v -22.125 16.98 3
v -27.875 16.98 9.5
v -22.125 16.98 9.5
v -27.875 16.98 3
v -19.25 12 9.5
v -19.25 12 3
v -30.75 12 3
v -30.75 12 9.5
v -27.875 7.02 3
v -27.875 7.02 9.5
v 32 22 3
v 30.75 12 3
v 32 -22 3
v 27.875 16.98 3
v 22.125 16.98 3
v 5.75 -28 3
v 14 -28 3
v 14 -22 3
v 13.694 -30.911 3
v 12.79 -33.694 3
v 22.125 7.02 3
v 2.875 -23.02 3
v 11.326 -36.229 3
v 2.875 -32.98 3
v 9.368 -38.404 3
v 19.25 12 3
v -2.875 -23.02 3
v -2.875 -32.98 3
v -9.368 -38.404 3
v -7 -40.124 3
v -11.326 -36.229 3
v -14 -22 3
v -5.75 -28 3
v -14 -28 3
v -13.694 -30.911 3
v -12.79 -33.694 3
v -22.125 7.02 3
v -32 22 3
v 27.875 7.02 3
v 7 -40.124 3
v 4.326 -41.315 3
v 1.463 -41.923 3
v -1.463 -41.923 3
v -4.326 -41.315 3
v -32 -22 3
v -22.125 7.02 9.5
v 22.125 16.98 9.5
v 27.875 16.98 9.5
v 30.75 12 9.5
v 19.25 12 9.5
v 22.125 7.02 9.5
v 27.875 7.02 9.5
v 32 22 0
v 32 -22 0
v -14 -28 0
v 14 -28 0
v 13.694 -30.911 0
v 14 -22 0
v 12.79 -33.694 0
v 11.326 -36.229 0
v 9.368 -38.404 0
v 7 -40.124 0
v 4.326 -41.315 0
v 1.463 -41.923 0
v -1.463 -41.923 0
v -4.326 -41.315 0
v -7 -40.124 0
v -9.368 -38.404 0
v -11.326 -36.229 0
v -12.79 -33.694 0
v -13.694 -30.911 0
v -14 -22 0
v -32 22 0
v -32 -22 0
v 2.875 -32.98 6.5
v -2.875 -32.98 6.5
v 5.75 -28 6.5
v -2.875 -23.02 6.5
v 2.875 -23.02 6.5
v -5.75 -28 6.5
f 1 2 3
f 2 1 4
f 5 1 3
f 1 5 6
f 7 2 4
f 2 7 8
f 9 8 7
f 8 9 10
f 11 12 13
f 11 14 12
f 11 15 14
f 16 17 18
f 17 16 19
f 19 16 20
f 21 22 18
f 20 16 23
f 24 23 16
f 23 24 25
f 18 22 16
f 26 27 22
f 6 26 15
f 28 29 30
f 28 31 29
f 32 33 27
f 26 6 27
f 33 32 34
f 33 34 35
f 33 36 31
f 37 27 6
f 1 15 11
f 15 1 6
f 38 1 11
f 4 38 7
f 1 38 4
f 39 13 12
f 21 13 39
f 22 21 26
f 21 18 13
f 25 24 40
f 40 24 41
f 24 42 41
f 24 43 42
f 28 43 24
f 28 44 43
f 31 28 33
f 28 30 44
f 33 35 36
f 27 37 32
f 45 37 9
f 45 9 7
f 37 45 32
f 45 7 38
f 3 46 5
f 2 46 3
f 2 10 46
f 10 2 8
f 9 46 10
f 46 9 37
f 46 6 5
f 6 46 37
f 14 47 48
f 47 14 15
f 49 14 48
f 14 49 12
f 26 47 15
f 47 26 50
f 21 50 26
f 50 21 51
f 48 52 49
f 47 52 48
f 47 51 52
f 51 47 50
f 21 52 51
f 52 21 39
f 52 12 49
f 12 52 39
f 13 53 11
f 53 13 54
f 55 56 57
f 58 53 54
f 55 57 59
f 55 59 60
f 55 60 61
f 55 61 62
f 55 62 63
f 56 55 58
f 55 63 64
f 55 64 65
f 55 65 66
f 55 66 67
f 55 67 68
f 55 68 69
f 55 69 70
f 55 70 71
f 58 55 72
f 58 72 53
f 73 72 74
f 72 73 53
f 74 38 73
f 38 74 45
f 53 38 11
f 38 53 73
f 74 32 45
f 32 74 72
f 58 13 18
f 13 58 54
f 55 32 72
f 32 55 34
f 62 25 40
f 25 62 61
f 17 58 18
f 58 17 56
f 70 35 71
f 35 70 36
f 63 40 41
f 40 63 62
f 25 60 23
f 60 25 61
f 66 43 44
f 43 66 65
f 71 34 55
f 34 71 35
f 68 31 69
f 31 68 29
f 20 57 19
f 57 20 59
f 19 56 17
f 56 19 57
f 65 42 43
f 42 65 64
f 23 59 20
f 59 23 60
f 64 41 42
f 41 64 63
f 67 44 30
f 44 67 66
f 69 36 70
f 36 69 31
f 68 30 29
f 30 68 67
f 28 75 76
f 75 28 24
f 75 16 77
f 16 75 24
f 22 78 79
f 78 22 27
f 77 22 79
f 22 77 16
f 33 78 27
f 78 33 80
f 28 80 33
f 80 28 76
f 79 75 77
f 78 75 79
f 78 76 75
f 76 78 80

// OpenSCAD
// file: extrusor_pmi2.scad
$fn = 30;

PARED_ANCHO = 2;
PARED_ALTO = 3;

ANCHO = 62;
ALTO = 54;
BASE_POS_Z = ALTO-2.5;

TOR_DIS_DIAM = 4;
TOR_MOTOR_DIAM = 3;

// Variables globales extrusor
    motor_ancho = 42;
    motor_alto = motor_ancho;
    motor_diam_front = 25;
    ancho = motor_ancho;
    alto = motor_alto;
    espesor = 13;
    dist_tor = 34-TOR_MOTOR_DIAM;
    engran_diam = 8.4;
    ruleman_diam = 16;
    ruleman_alto = 5;
    filam_diam = 1.75;

module Soporte(cube1, cube2, posc2)
{
    hull() {
        cube(cube1);
        translate(posc2) cube(cube2);
    }
}

module Motor(tor_alt = 10, cyl_front_alt = 2, cyl_engr_alt = 13)
{
    cube([motor_alto, motor_ancho, 30]); //cuerpo
    translate([motor_alto/2, motor_ancho/2,-cyl_front_alt]) 
        cylinder(r = motor_diam_front/2, h = cyl_front_alt); //frente
    translate([motor_alto/2, motor_ancho/2,-cyl_engr_alt]) 
        cylinder(r = engran_diam/2, h = cyl_engr_alt); //engranaje
    for(i = [-1, 1], j = [-1, 1]) 
            translate([alto/2+dist_tor/2*i, ancho/2+dist_tor/2*j, -tor_alt]) 
                cylinder(r = TOR_MOTOR_DIAM/2+.5, h = tor_alt);
}

module ExBloqueBaseInf(pos_x = 0, pos_y = 0, pos_filam = 8.5)
{
    translate([pos_x-pos_filam, pos_y-(motor_ancho/2-engran_diam/2-filam_diam/2),0]) {
        difference(){ union() {
                
                cube([espesor, motor_ancho, 11]);
                translate([0, motor_ancho/2-7, 11]) 
                    Soporte([espesor, motor_ancho/2+7, 0.0001], [6, motor_ancho/2+7, 4], [espesor-6, 0, 0]);
                /*translate([0, motor_ancho/2, 10])   
                    cube([espesor, motor_ancho/2+12, motor_alto-10-25]);*/
            }
            translate([0, 0, 0]) rotate([0, -90, 0])
                #Motor(espesor-.5, 3/*espesor*/);
           /* translate([espesor/2, motor_ancho+12/2, 0]) 
                #cylinder(r = 4.5/2, h = motor_alto/2);*/
            translate([pos_filam, motor_ancho/2-engran_diam/2-filam_diam/2]) 
                #cylinder(r = filam_diam/2, h = motor_alto*2);
        }  
    }
   
}

module ExBloqueMovilSup(pos_x = 0, pos_y = 0, pos_filam = 8.5)
{
    translate([pos_x-pos_filam, pos_y-(motor_ancho/2-engran_diam/2-filam_diam/2),0]) {
        difference(){ union() {
                translate([0, 0, motor_alto-8]) rotate([35, 0, 0]) cube([espesor, motor_ancho+12, 8]);
                translate([0, (ruleman_diam-4)/2, motor_alto/2]) hull(){
                    rotate([0, 90, 0]) cylinder(r = ruleman_diam/2-2, h = espesor, center = false);
                       //1, ruleman_diam-2, espesor]);
                    translate([0, -(ruleman_diam-4)/2, motor_alto/2-1]) 
                        cube([espesor, ruleman_diam-4, 1]);
                }
                translate([espesor/2, 0, motor_alto-8-8]) 
                    rotate([35, 0, 0])
                        translate([0, ancho/2+dist_tor/2, 0])
                            cylinder(r = 4/2, h = 8);
                translate([5, ancho/2-dist_tor/2, motor_alto-8-10]) rotate([35, 0, 0]) cube([espesor-5, 16, 19.3]);
            
            }
            translate() rotate([0, -90, 0])
                #Motor(espesor, 3, 13);
            translate() cube([3, ruleman_diam-4, motor_alto*3/4]);
            translate([3,(ruleman_diam-4)/2,motor_alto/2]) rotate([0, 90, 0]) 
                #cylinder(r = 7.5/2, h = 1.5, $fn = 6);
            translate([3,(ruleman_diam-4)/2,motor_alto/2]) rotate([0, 90, 0]) 
                #cylinder(r = 5/2, h = espesor);
            translate([espesor-7,(ruleman_diam-4)/2,motor_alto/2]) rotate([0, 90, 0]) 
                #cylinder(r = (ruleman_diam+4)/2, h = 5);
            hull() {
                translate([pos_filam, motor_ancho/2-engran_diam/2-filam_diam*3/2, motor_alto/2]) 
                    #cylinder(r = filam_diam/2, h = motor_alto);
                translate([pos_filam, motor_ancho/2-engran_diam/2+filam_diam/2, motor_alto/2]) 
                    #cylinder(r = filam_diam/2, h = motor_alto);
            }
        }
    }
}

module ExBloqueResSup(pos_x = 0, pos_y = 0, pos_filam = 8.5)
{
    translate([pos_x-pos_filam, pos_y-(motor_ancho/2-engran_diam/2-filam_diam/2),0]) {
        difference(){ union() {
                translate([0, motor_ancho-12, motor_alto-10]){
                    difference() {
                        cube([espesor, 12, 10]);
                        translate([0, 0, 4]) rotate([35, 0, 0]) cube([espesor, 16, 10]);
                    }
                    
                }
                // , ancho/2+dist_tor/2*j
                 translate([espesor/2, ancho/2+dist_tor/2, alto/2+dist_tor/2]) 
                    rotate([32, 0, 0]) cylinder(r = 4/2, h = 10);
                
            }
            translate([0, 0, 0]) rotate([0, -90, 0])
                #Motor(espesor, espesor);
        }  
    }
}

// diam engranaje empuje: 8,8 mm
module Extruder()
{
    ExBloqueBaseInf();
   // rotate([180-35, 0, 0])
    //    ExBloqueMovilSup();
   // ExBloqueResSup();
}

//Extruder();
// main file
include <extrusor_pmi2.scad>;

$fn = 30;

PARED_ANCHO = 2;
PARED_ALTO = 3;

ANCHO = 62;
ALTO = 54;
BASE_POS_Z = ALTO-2.5;

TOR_DIS_DIAM = 4;
TOR_MOTOR_DIAM = 3;


module Soporte(cube1, cube2, posc2)
{
    hull() {
        cube(cube1);
        translate(posc2) cube(cube2);
    }
}

Disp_sop_alto = 20;
Disp_sop_ancho = 30;
module SoporteDisipador(pos_x = 0, pos_y = 0)
{
    Disp_sop_alto = 20;
    Disp_sop_ancho = 30;
    dist_tor = 18-TOR_DIS_DIAM;
    translate([pos_x-Disp_sop_alto/2, pos_y-Disp_sop_ancho/2]) {
        difference(){ union() {
                cube([Disp_sop_alto, Disp_sop_ancho, 6]);
            }
            translate([Disp_sop_alto/2-14/2, Disp_sop_ancho/2-26/2, 0]) #cube([14, 26, 3]);
            translate([10, Disp_sop_ancho/2-dist_tor/2, 3.5]) cylinder(r = TOR_DIS_DIAM/2+.5, 6);
            translate([10, Disp_sop_ancho/2+dist_tor/2, 3.5]) cylinder(r = TOR_DIS_DIAM/2+.5, 6);
        }
    }
}


// Pos: x = 30mm desde los tornillos del disipador, y = centro + diam_filamento / 2
module SoporteMotor(pos_x = 0, pos_y = 0)
{
    translate([BASE_POS_Z-13-30, ANCHO/2, 6+5]) rotate([0, 90, 180]) ExBloqueBaseInf();
}

module SoporteExtruder()
{
    difference(){ union() {
            cube([2, ANCHO, 1]);
            Soporte([5, .001, PARED_ANCHO], [5, 1, PARED_ANCHO], [ALTO-5, ANCHO-1, 0]);
            translate([0,ANCHO,PARED_ANCHO]) rotate([180,0,0]) Soporte([5, .001, PARED_ANCHO], [5, 1, PARED_ANCHO], [ALTO-5, ANCHO-1, 0]);
            translate([1, 0, 0]) Soporte([3, ANCHO, .001], [1, ANCHO, .001], [0 ,0, 3]);
            translate([1, 0, 0]) cube([ALTO-1-2.5, PARED_ANCHO, 2.5]);
            translate([1, ANCHO-PARED_ANCHO, 0]) cube([ALTO-1-2.5, PARED_ANCHO, 2.5]);
            translate([ALTO/2-1/2, 0, 0]) cube([2, ANCHO, 2.5]);
            translate([BASE_POS_Z-3, 0, 0]) cube([3, ANCHO, 2.5]);
            //Agarre disipador
            SoporteDisipador(BASE_POS_Z-13,ANCHO/2);
            //Agarre Motor
            SoporteMotor();
            //Soportes Motor
            translate([1,5,0]) cube([8,2,3]);
            translate([1,5,3]) Soporte([8, 2, .0001], [11, 2, 0.001], [-3.5-4,0,3.5]);
            translate([1,ANCHO/2-Disp_sop_ancho/2,0]) cube([ALTO-13, 2, 3]);
            translate([1,ANCHO/2-Disp_sop_ancho/2,3]) 
                Soporte([ALTO-13, 2, .001], [11, 2, 3], [-3.5-4, 0, 3.5]);
            translate([1,ANCHO/2+4/2-2.5,0]) cube([ALTO-13, 2, 3]);
            translate([1,ANCHO/2+4/2-2.5,3]) 
                Soporte([ALTO-13, 2, .001], [11, 2, 2], [-3.5-4, 0, 3.5]);
            translate([1,ANCHO/2+Disp_sop_ancho/2-2,0]) cube([ALTO-13, 2, 3]);
            translate([1,ANCHO/2+Disp_sop_ancho/2-2,3]) 
                Soporte([ALTO-13, 2, .001], [11, 2, 3], [-3.5, 0, 3.5]);
            // Topes inferiores
            translate([ALTO-2.5-5, 0, 0]) cube([5, 5, 5]);
            translate([ALTO-2.5-5, ANCHO-5, 0]) cube([5, 5, 5]);
            
        } // Menos
        // Trava superior e inferior
        translate([0, 0, 1]) cube([1, ANCHO, 1]);
        translate([BASE_POS_Z, 0, 1]) cube([2.5, ANCHO, 1]);
        // Agarre disipador
        translate([BASE_POS_Z-13-14/2,ANCHO/2-26/2,0]) #cube([14, 26, 3]);
    }
}

module CarroX()
{
    ancho1  = 64;
    alto1   = 44;
    ancho2  = 28;
    alto2   = 64;
    espesor = 3;
    
    rueda_tuer_diam   = 8.5+3;
    rueda_tuer_alto   = 5.5+1;
    rueda_tuer_x_dist = 7;
    rueda_tuer_y_dist = 10;
    
    difference() {
        union() {
            // base
            translate([0,0,espesor/2]) cube([ancho1, alto1, espesor], center=true);
            hull() {
                translate([0, 0, espesor/2]) cube([ancho2, alto1, espesor], center=true);
                translate([0, alto1/2-50, 0]) cylinder(d=ancho2, h=espesor);
            }
            // tuercas ruedas superiores
            for(i=[-1, 1]) {
                translate([ancho1/2*i-rueda_tuer_x_dist*i, alto1/2-rueda_tuer_y_dist, espesor]) 
                    cylinder(d=rueda_tuer_diam, h=rueda_tuer_alto, $fn=6);
            }
            translate([0, alto1/2-50, 0]) 
                    cylinder(d=rueda_tuer_diam, h=rueda_tuer_alto, $fn=6);
            // 
        }
    }
}

CarroX();

//SoporteExtruder();
//SoporteDisipador();
//SoporteMotor();
//Extruder();
